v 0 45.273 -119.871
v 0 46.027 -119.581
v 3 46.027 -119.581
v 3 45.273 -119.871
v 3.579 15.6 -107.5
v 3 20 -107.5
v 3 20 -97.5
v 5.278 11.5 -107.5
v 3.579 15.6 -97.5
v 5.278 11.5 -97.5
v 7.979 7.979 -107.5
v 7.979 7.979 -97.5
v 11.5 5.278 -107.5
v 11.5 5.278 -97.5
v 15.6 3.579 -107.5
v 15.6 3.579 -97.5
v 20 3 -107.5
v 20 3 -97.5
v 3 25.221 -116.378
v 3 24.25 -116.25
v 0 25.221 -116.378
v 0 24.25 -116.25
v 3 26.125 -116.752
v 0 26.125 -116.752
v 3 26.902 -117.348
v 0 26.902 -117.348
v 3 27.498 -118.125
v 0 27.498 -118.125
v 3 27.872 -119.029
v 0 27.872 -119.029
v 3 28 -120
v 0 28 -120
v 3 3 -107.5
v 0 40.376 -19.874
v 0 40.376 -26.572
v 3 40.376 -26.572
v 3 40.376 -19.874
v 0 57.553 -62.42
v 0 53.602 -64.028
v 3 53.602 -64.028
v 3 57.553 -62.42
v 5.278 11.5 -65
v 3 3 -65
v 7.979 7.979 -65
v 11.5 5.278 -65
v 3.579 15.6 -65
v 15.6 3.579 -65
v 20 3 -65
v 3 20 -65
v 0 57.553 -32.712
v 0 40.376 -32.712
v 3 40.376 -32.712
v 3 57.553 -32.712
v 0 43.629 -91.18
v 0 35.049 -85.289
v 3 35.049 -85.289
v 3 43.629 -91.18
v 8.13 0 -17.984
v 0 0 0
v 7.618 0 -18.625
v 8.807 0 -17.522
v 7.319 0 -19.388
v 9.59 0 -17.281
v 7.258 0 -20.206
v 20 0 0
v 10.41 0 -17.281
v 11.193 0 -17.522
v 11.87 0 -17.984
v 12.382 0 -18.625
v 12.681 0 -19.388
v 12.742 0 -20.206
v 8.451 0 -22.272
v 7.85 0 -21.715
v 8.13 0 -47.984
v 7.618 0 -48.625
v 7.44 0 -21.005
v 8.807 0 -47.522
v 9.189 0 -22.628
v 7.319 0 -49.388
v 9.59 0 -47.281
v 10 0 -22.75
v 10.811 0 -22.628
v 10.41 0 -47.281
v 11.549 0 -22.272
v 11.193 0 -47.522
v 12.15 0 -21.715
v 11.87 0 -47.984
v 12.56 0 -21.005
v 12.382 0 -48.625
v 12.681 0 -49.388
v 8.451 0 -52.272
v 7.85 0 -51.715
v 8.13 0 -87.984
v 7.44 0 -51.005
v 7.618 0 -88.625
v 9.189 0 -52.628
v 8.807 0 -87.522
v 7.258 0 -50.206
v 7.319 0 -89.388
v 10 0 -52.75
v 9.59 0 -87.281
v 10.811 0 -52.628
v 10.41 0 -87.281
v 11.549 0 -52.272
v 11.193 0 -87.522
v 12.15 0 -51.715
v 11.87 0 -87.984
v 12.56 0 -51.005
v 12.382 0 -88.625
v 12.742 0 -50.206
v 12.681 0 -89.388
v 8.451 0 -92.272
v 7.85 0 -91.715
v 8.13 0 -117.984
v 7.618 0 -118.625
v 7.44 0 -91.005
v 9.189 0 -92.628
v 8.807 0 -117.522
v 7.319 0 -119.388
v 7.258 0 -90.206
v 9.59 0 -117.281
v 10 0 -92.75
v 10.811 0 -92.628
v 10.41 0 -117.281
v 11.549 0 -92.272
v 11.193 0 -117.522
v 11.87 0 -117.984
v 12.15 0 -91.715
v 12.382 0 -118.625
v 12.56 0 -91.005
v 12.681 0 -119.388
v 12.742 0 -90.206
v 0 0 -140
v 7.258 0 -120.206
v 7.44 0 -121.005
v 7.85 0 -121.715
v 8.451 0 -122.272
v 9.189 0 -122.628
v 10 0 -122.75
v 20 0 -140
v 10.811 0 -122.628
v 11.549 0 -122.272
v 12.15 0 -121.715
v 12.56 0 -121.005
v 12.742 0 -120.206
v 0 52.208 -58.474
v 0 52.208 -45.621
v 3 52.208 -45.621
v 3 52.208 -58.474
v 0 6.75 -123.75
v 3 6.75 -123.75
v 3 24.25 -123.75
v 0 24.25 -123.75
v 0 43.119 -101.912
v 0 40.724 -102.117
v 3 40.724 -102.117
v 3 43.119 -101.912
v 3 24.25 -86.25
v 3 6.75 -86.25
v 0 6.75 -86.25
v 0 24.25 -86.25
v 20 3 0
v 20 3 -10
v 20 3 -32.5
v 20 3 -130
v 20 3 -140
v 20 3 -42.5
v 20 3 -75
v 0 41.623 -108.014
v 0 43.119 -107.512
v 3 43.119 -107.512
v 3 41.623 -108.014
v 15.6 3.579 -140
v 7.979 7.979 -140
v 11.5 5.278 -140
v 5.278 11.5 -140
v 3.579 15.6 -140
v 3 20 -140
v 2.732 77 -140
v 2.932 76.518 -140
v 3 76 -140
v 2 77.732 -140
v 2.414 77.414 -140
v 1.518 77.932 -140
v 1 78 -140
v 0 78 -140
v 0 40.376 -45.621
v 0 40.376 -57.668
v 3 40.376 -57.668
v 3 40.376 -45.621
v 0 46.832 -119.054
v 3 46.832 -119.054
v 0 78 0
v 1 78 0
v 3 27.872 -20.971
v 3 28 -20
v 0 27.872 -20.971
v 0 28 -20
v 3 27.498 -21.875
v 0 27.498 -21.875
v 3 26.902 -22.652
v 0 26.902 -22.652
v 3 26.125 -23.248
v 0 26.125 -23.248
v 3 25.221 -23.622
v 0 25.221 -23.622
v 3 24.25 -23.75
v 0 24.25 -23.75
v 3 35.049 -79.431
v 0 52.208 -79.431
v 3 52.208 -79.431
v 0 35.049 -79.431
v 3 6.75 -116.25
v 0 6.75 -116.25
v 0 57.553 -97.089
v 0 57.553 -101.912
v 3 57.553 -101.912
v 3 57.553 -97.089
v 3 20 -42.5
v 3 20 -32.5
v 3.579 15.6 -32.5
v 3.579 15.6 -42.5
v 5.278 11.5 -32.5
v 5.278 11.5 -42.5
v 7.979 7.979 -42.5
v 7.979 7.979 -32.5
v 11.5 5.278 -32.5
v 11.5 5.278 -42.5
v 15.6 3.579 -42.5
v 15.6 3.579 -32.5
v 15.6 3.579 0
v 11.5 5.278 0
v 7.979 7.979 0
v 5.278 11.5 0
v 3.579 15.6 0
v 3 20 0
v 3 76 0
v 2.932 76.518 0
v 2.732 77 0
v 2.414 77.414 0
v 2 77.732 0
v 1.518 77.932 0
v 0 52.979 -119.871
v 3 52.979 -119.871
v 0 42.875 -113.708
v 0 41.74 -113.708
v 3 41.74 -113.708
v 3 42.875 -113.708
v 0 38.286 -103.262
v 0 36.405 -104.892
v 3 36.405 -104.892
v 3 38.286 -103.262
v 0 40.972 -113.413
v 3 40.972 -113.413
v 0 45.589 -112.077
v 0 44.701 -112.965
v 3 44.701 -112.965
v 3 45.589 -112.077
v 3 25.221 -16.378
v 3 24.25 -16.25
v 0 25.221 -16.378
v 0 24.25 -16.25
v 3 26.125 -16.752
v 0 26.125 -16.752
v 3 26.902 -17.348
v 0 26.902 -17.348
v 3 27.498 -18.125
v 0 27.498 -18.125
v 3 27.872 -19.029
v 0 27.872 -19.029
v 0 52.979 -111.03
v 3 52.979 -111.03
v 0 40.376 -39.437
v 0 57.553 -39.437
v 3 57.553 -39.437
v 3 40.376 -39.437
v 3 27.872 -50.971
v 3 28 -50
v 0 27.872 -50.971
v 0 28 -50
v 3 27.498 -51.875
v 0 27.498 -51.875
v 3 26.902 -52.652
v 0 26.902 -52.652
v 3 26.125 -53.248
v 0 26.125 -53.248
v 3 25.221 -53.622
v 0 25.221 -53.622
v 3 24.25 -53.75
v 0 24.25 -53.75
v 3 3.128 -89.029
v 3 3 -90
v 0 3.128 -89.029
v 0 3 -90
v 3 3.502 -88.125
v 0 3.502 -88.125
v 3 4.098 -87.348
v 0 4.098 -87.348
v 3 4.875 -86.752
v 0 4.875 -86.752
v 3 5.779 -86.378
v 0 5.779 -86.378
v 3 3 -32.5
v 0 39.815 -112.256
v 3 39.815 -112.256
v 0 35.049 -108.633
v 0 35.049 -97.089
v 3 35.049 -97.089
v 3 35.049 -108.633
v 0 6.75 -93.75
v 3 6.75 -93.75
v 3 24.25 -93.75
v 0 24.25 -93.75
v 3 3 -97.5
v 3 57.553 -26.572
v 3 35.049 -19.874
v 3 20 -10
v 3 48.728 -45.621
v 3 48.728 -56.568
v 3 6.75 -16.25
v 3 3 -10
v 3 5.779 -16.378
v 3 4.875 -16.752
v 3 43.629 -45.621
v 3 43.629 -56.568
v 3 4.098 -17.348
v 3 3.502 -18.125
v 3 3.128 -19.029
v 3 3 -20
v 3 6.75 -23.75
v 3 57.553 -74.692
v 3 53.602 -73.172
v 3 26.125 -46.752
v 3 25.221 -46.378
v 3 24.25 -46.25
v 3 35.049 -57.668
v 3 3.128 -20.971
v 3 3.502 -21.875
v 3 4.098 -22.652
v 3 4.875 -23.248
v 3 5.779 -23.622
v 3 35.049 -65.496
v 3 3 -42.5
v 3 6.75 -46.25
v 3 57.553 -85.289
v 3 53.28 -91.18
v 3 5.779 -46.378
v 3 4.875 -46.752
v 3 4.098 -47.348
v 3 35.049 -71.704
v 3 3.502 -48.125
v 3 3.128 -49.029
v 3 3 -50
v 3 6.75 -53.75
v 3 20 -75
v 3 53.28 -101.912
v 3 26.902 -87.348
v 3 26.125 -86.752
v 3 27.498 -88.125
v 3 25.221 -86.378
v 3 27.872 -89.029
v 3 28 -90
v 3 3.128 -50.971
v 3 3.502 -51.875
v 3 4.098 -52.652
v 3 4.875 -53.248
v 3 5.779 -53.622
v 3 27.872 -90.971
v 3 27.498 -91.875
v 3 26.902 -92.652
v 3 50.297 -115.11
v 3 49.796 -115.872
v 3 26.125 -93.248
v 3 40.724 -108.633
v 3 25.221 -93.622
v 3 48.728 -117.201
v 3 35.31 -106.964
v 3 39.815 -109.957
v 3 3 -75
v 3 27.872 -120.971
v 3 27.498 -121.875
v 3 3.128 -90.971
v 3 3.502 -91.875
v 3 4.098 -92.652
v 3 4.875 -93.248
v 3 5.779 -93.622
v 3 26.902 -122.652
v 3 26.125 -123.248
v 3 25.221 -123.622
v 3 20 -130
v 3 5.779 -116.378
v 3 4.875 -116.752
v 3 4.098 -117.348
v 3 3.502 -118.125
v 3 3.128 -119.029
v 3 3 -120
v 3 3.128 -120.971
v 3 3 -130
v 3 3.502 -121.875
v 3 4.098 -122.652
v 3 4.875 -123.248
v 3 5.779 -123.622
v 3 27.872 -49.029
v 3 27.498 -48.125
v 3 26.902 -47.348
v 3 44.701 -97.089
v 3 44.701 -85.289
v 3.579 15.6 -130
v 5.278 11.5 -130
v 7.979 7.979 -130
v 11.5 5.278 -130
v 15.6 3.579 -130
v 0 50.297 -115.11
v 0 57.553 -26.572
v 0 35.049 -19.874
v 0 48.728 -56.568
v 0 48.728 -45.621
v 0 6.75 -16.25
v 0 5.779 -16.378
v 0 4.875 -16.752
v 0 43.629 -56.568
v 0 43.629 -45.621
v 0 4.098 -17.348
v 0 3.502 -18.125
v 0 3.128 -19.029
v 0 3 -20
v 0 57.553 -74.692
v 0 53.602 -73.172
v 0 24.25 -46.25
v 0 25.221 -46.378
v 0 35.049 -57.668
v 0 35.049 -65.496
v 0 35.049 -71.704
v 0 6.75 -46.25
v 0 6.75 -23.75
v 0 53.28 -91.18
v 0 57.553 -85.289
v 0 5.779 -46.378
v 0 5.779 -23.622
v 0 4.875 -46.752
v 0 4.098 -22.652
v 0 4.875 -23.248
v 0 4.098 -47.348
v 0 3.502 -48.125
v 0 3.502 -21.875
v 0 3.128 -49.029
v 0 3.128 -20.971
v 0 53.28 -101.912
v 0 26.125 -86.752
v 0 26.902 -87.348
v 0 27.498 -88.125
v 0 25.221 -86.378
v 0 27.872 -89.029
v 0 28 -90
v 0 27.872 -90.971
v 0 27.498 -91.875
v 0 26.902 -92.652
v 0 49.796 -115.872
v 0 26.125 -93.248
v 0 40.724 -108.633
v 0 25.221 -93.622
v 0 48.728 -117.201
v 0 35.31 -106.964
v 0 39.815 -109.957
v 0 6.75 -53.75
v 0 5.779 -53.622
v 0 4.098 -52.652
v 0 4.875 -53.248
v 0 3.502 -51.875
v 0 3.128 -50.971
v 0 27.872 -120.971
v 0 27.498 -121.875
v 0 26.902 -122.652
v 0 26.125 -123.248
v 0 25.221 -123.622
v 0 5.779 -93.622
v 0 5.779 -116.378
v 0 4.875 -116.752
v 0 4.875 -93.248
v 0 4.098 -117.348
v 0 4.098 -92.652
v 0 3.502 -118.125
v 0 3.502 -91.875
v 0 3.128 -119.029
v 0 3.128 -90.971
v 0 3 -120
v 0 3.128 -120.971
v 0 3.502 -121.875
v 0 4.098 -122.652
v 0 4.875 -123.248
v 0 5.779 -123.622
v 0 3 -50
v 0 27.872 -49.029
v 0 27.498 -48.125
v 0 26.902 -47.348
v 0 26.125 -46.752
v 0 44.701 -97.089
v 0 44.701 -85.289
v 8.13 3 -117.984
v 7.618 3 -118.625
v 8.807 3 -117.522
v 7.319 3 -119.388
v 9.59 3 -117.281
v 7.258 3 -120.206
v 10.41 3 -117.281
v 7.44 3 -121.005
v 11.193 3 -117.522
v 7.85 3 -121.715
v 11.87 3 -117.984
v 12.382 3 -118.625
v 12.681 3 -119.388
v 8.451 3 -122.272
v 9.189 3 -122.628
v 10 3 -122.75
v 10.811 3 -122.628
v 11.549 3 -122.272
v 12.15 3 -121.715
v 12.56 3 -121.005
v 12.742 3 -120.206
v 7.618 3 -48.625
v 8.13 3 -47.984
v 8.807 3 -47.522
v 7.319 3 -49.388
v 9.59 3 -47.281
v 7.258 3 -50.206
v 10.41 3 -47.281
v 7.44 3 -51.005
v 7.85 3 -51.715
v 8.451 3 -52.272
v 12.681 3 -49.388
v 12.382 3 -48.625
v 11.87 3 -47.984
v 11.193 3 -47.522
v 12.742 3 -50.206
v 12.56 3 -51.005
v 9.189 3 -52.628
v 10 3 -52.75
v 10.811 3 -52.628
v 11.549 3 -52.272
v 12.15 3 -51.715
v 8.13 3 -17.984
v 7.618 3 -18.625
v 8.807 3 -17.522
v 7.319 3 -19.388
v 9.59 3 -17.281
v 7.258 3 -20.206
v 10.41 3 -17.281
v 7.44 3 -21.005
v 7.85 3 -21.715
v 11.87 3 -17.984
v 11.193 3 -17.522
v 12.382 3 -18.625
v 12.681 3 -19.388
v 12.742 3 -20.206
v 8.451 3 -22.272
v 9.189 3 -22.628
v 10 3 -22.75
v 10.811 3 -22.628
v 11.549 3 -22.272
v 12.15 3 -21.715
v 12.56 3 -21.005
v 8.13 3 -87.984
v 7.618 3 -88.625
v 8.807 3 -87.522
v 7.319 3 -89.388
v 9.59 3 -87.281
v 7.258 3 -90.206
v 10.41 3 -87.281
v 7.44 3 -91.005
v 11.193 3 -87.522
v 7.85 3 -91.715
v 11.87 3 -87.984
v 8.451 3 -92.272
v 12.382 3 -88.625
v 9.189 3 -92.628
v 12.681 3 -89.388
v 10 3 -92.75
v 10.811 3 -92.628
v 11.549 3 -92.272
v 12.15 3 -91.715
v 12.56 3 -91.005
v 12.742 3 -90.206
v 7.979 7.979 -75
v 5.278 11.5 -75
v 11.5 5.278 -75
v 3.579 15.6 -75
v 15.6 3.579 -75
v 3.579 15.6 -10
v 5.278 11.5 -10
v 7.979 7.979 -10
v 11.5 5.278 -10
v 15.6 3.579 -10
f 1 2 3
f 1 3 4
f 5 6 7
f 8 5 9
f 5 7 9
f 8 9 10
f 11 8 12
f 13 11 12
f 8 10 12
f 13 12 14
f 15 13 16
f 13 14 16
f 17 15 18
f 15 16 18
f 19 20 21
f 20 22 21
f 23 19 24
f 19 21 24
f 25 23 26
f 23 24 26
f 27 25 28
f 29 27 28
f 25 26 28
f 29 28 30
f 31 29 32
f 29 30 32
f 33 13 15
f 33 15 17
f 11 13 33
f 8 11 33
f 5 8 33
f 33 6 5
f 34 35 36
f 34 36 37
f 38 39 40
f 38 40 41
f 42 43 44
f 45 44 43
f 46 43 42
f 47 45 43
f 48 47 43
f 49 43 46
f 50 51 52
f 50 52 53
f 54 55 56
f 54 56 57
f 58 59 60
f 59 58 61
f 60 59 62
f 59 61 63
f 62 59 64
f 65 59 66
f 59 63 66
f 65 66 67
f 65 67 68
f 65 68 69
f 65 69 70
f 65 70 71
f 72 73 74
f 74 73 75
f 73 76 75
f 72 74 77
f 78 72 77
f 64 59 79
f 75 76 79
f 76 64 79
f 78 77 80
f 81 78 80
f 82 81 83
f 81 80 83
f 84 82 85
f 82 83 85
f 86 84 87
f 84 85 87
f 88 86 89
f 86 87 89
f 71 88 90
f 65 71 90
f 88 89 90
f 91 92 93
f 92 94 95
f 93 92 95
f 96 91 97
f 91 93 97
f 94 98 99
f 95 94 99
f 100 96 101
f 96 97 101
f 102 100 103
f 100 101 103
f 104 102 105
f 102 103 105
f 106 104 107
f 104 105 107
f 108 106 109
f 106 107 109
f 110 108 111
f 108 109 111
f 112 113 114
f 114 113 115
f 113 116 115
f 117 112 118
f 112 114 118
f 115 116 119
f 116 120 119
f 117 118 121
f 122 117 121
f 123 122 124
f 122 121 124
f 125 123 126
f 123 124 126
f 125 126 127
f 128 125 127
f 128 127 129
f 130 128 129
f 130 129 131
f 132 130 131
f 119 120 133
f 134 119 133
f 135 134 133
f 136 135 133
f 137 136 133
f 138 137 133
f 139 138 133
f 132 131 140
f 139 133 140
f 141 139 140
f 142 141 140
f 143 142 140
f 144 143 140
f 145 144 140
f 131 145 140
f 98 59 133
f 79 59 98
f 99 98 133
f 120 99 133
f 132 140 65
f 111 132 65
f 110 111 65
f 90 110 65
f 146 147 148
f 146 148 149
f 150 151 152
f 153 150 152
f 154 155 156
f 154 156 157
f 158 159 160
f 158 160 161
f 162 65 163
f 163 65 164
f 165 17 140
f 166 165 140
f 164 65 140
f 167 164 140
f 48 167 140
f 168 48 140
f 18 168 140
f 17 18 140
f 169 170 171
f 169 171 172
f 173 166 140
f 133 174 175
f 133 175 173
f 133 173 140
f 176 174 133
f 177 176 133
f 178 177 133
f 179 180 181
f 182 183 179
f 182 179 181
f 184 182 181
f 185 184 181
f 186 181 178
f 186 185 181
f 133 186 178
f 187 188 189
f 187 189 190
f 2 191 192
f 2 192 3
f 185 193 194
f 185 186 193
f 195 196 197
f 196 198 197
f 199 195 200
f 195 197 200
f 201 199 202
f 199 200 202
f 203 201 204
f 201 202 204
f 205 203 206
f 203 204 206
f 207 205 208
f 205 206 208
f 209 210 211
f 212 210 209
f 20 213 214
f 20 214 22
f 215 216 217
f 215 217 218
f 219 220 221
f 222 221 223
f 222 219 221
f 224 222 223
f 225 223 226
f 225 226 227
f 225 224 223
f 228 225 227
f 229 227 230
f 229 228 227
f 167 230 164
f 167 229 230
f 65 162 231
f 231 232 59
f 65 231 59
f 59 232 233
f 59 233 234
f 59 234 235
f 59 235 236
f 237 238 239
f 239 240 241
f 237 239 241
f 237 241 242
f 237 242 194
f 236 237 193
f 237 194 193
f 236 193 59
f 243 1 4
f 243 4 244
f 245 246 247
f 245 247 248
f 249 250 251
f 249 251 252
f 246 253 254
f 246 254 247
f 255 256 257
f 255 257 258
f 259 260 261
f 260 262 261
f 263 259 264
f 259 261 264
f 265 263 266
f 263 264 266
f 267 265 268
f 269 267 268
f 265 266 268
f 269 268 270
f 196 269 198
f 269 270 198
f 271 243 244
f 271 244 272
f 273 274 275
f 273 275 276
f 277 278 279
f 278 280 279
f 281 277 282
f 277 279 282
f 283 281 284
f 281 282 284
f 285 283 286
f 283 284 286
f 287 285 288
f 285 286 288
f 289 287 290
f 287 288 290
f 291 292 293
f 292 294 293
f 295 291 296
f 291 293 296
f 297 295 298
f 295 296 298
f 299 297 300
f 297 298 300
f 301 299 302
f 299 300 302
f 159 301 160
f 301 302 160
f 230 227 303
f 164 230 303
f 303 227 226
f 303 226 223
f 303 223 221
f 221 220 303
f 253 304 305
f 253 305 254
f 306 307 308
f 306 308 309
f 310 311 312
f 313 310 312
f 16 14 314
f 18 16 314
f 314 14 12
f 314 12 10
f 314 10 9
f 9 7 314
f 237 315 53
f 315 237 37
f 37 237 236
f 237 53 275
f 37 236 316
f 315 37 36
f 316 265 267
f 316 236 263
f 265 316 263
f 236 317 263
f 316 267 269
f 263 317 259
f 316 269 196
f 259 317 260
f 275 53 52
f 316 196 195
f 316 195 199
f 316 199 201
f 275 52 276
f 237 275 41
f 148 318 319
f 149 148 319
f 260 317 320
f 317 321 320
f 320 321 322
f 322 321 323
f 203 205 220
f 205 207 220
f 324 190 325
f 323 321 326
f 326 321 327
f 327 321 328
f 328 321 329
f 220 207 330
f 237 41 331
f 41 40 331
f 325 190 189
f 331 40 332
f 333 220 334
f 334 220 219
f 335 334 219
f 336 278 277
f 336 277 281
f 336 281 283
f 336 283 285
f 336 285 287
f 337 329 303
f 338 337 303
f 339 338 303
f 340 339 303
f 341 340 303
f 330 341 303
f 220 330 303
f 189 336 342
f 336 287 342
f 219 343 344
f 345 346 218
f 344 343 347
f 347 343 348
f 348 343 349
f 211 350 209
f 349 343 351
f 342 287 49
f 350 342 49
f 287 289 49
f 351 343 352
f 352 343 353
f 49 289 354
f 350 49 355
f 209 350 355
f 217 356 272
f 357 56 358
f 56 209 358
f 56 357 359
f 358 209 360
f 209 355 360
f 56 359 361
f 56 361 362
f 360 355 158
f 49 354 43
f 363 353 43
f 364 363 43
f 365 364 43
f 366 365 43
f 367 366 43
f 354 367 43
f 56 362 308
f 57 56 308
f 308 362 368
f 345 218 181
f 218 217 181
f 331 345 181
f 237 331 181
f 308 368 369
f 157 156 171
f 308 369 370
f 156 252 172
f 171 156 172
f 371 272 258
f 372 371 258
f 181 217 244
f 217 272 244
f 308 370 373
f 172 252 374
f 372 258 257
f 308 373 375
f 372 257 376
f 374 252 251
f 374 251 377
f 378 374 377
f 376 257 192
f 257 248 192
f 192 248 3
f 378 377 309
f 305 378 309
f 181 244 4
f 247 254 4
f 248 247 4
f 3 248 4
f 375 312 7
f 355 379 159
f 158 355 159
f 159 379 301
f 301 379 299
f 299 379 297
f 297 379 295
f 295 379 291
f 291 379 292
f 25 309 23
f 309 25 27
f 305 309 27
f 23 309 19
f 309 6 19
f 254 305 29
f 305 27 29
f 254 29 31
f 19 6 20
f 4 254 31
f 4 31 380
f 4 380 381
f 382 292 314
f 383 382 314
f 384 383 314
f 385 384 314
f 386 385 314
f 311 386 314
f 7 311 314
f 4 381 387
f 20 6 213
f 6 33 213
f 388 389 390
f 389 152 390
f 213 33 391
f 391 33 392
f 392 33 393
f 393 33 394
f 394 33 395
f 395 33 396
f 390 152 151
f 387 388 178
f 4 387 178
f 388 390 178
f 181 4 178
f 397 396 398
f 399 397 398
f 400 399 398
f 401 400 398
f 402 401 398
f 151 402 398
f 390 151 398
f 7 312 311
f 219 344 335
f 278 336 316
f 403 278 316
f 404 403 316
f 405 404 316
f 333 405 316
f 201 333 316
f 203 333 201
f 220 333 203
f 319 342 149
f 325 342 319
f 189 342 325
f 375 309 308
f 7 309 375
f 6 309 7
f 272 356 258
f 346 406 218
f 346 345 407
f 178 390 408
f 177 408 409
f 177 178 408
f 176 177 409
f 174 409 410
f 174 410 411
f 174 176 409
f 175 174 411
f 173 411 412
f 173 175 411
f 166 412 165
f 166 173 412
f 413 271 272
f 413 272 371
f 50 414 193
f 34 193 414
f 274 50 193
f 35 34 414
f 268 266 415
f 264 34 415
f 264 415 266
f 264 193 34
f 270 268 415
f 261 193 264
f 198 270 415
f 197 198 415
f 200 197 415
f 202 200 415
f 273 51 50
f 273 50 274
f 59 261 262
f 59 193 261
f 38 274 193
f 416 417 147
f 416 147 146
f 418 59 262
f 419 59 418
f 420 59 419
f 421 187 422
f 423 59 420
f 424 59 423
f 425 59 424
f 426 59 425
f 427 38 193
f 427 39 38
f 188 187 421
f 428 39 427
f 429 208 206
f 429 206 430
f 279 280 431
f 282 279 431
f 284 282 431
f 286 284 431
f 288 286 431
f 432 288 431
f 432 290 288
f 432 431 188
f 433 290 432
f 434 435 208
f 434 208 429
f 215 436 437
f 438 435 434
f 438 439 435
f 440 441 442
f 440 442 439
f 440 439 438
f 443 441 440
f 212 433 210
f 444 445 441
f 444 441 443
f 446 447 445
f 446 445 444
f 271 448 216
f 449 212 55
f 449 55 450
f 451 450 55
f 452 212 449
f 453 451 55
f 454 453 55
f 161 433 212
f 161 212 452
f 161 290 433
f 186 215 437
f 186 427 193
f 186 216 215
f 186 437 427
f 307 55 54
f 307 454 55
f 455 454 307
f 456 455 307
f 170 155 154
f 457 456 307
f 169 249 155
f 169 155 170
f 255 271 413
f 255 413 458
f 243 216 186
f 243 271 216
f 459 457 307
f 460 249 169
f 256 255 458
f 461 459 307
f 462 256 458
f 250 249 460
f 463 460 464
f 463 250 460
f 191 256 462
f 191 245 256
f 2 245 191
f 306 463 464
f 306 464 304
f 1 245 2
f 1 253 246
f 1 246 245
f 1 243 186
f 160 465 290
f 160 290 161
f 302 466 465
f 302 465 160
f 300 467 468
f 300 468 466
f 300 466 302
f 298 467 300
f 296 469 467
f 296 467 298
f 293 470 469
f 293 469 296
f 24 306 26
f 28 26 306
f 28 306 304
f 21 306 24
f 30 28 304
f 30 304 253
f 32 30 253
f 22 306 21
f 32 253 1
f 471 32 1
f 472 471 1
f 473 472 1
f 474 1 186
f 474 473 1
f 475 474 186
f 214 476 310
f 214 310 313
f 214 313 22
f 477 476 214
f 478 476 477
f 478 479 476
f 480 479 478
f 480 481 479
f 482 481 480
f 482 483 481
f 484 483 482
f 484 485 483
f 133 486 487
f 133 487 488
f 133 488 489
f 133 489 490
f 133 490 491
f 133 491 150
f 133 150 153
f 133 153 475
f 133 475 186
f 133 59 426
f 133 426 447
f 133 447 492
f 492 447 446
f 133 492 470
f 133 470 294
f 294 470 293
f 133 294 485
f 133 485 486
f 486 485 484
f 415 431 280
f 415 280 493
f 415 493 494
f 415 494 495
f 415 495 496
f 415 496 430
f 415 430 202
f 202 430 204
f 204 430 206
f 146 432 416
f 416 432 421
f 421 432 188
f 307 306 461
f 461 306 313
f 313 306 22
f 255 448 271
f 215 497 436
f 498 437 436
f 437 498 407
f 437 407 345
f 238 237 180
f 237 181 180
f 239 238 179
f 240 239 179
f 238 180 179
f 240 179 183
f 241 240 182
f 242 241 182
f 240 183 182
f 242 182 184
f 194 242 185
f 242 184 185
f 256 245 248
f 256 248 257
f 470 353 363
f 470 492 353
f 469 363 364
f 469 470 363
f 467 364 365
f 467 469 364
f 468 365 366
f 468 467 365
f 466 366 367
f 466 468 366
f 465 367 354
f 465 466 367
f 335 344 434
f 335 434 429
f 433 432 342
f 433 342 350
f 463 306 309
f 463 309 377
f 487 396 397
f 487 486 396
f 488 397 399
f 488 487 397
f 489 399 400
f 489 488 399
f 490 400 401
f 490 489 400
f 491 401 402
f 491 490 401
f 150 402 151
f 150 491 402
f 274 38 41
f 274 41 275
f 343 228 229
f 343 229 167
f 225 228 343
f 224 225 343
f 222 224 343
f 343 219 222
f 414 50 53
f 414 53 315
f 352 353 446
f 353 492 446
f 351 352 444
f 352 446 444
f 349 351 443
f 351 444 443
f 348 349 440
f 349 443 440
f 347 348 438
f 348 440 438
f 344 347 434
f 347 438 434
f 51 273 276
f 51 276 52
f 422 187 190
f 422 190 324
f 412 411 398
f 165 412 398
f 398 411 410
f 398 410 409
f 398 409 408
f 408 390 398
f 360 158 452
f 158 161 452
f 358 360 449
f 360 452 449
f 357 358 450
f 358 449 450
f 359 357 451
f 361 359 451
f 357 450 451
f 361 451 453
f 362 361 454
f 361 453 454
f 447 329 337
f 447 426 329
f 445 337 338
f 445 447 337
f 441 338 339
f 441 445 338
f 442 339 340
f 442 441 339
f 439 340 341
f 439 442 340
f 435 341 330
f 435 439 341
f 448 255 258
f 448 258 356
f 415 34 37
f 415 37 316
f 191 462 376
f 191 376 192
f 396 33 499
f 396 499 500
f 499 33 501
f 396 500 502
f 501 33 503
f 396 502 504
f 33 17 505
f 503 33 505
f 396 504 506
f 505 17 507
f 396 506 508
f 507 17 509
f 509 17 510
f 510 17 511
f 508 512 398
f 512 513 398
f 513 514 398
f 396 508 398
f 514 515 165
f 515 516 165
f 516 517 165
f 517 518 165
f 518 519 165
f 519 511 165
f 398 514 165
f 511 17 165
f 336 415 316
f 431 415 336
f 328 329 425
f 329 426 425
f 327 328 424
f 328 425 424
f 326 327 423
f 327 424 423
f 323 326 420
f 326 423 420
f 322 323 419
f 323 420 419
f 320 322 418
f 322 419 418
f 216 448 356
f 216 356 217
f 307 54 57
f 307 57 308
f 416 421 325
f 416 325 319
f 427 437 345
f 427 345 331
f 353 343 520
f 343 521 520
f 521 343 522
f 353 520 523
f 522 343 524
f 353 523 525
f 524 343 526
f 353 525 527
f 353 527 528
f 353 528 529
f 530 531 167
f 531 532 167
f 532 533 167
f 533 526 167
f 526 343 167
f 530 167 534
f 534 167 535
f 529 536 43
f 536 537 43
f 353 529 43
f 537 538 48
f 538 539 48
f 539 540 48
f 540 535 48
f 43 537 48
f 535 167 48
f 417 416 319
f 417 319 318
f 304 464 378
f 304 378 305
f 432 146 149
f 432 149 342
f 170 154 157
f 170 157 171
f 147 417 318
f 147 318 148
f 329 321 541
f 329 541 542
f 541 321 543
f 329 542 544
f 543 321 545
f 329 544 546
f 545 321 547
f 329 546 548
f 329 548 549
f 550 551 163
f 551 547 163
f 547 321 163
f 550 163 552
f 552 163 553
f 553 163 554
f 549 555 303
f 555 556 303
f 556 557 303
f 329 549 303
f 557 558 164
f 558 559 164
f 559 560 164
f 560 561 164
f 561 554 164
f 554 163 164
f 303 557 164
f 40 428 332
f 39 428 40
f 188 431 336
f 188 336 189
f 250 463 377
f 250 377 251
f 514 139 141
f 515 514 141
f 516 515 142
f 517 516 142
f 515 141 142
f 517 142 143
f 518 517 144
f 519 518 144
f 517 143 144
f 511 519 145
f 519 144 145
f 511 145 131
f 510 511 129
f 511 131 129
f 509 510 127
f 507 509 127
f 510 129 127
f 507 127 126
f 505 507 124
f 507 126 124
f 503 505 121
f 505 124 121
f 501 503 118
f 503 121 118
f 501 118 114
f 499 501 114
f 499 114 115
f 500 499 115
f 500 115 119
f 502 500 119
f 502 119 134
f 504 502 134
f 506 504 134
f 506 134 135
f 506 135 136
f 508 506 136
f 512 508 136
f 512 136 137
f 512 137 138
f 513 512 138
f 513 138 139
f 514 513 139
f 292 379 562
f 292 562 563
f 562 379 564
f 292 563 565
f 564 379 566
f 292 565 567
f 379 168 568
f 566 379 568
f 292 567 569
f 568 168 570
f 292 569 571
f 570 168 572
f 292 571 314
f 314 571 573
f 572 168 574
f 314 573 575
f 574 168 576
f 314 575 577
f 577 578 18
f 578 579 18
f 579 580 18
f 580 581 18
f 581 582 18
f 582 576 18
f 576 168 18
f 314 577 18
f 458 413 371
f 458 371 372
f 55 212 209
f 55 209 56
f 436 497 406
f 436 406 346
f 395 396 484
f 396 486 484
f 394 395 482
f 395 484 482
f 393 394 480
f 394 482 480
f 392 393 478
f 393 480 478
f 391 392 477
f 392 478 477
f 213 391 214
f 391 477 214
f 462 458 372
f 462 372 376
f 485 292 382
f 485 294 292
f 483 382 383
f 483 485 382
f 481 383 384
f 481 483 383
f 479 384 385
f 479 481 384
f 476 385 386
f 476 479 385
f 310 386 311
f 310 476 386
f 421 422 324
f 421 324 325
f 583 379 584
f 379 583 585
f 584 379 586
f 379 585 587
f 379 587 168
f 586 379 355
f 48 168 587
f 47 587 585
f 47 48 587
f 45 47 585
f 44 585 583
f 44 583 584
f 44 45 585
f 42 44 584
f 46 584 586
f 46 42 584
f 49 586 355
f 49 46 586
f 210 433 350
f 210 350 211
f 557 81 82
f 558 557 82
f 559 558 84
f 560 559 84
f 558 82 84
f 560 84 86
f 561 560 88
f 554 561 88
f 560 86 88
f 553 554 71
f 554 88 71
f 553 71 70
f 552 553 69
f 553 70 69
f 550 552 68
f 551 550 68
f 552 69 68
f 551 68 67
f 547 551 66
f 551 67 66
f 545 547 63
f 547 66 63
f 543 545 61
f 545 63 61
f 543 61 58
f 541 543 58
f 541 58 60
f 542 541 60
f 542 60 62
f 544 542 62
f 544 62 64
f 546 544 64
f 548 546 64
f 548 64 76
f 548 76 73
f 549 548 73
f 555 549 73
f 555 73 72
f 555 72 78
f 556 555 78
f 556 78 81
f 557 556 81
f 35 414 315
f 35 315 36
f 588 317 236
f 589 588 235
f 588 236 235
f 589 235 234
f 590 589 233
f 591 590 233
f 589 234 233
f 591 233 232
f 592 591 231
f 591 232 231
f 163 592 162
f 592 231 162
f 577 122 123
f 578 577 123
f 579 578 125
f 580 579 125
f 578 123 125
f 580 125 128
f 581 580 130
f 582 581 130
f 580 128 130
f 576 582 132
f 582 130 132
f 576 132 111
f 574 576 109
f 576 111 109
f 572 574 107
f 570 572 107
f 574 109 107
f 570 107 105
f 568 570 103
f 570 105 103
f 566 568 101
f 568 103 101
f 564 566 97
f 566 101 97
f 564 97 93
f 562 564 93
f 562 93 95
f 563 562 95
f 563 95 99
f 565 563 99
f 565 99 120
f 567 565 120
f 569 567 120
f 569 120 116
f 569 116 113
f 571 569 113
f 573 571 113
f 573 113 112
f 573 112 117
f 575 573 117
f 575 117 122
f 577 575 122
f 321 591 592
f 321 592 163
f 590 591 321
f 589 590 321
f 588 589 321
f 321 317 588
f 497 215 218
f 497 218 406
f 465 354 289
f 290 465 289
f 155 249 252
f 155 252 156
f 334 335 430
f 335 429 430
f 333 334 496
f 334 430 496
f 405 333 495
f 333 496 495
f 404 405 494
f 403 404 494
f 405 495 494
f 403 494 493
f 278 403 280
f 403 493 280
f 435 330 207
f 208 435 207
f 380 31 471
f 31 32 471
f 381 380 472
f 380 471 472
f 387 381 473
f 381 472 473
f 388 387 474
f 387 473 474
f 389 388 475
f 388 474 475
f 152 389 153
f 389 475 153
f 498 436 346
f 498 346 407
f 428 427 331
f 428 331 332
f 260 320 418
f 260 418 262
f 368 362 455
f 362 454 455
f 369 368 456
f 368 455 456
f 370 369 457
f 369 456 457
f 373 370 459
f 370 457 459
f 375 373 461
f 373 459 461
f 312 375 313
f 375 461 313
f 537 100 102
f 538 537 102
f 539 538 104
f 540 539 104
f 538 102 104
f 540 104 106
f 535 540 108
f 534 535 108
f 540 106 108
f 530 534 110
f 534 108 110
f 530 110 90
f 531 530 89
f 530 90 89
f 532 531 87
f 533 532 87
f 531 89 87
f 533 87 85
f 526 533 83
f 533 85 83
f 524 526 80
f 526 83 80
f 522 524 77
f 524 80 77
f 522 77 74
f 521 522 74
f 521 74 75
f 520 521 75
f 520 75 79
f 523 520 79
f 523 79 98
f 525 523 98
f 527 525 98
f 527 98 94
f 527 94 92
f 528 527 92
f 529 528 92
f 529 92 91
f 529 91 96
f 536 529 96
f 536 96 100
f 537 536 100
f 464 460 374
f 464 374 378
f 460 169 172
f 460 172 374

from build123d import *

# Parameters (mm, degrees)
SKETCH1_W           = 20
SKETCH1_H           = 140
BOSS_EXTRUDE1_DEPTH = 3
SKETCH2_W           = 3
SKETCH2_H           = 140
BOSS_EXTRUDE2_DEPTH = 75
SKETCH4_R           = 2.75
CUT_EXTRUDE1_DEPTH  = 10
CUT_EXTRUDE5_DEPTH  = 10
SKETCH13_W          = 7.5
SKETCH13_H          = 25
CUT_EXTRUDE6_DEPTH  = 162.161409773
BOSS_EXTRUDE3_DEPTH = 10
BOSS_EXTRUDE4_DEPTH = 5
FILLET1_R           = 3.75
BOSS_EXTRUDE5_DEPTH = 5
FILLET2_R           = 2


with BuildPart() as part:
    # Sketch1 → Boss-Extrude1 (new body)
    with BuildSketch(Plane(origin=(0, 0, 0), x_dir=(1, 0, 0), z_dir=(0, 1, 0))):
        with Locations((10, 70)):
            Rectangle(SKETCH1_W, SKETCH1_H)
    extrude(amount=BOSS_EXTRUDE1_DEPTH)

    # Sketch2 → Boss-Extrude2 (add)
    with BuildSketch(Plane(origin=(0, 3, 0), x_dir=(1, 0, 0), z_dir=(0, 1, 0))):
        with Locations((1.5, 70)):
            Rectangle(SKETCH2_W, SKETCH2_H)
    extrude(amount=BOSS_EXTRUDE2_DEPTH)

    # Sketch4 → Cut-Extrude1 (cut)
    with BuildSketch(Plane.XZ):
        with Locations(Location((10, -20, 0), (0, 0, 270))):
            Circle(SKETCH4_R)
        with Locations(Location((10, -50, 0), (0, 0, 270))):
            Circle(SKETCH4_R)
        with Locations(Location((10, -120, 0), (0, 0, 270))):
            Circle(SKETCH4_R)
        with Locations(Location((10, -90, 0), (0, 0, 270))):
            Circle(SKETCH4_R)
    extrude(amount=-CUT_EXTRUDE1_DEPTH, mode=Mode.SUBTRACT)

    # Sketch11 → Cut-Extrude5 (cut)
    with BuildSketch(Plane.ZY):
        Polygon((-19.87445306, 35.049470042), (-57.66845643, 35.049470042), (-57.66845643, 40.375700466), (-45.620710845, 40.375700466), (-45.620710845, 43.628558514), (-56.567955095, 43.628558514), (-56.567955095, 48.727655429), (-45.620710845, 48.727655429), (-45.620710845, 52.207646986), (-58.474335361, 52.207646986), (-65.4959872, 35.049470042), (-71.703981953, 35.049470042), (-79.431402399, 52.207646986), (-79.431402399, 35.049470042), (-85.289263166, 35.049470042), (-91.179988836, 43.628558514), (-97.088991148, 35.049470042), (-108.632759584, 35.049470042), (-106.964389123, 35.31022439), (-104.891781353, 36.405186985), (-103.26233135, 38.285640805), (-102.117236881, 40.724472664), (-101.911986572, 43.118576138), (-107.511545976, 43.118576138), (-108.014068376, 41.622730328), (-108.632759584, 40.724472664), (-109.956613224, 39.815464831), (-112.255625181, 39.815464831), (-113.41257384, 40.97241349), (-113.707994228, 41.740190554), (-113.707994228, 42.874973674), (-112.965179572, 44.700944573), (-112.077421007, 45.588703138), (-101.911986572, 53.280033045), (-101.911986572, 57.552931735), (-97.088991148, 57.552931735), (-97.088991148, 44.700944573), (-91.179988836, 53.280033045), (-85.289263166, 44.700944573), (-85.289263166, 57.552931735), (-74.691981497, 57.552931735), (-73.171666345, 53.601738278), (-64.027833458, 53.601738278), (-62.420466982, 57.552931735), (-39.437456147, 57.552931735), (-39.437456147, 40.375700466), (-32.711511222, 40.375700466), (-32.711511222, 57.552931735), (-26.571823468, 57.552931735), (-26.571823468, 40.375700466), (-19.87445306, 40.375700466), align=None)
        Polygon((-119.870983837, 52.978567636), (-111.030217867, 52.978567636), (-115.109674503, 50.296859936), (-115.872275446, 49.795549834), (-117.201338289, 48.727655429), (-119.05433748, 46.831756703), (-119.581300631, 46.026502002), (-119.870983837, 45.273325665), align=None)
    extrude(amount=-CUT_EXTRUDE5_DEPTH, mode=Mode.SUBTRACT)

    # Sketch13 → Cut-Extrude6 (cut, through all)
    with BuildSketch(Plane(origin=(3, 0, 0), x_dir=(0, 0, -1), z_dir=(1, 0, 0))):
        with Locations((20, 15.5)):
            Rectangle(SKETCH13_W, SKETCH13_H)
        with Locations((50, 15.5)):
            Rectangle(SKETCH13_W, SKETCH13_H)
        with Locations((90, 15.5)):
            Rectangle(SKETCH13_W, SKETCH13_H)
        with Locations((120, 15.5)):
            Rectangle(SKETCH13_W, SKETCH13_H)
    extrude(amount=-CUT_EXTRUDE6_DEPTH, mode=Mode.SUBTRACT)

    # Sketch14 → Boss-Extrude3 (add)
    with BuildSketch(Plane.XY):
        with BuildLine():
            Line((3, 3), (3, 20))
            ThreePointArc((3, 20), (7.97918472, 7.97918472), (20, 3))
            Line((20, 3), (3, 3))
        make_face()
    boss_extrude3 = extrude(amount=-BOSS_EXTRUDE3_DEPTH)

    # Mirror1: Boss-Extrude3 across plane
    add(boss_extrude3.mirror(Plane.XY.offset(-70)))

    # Sketch15 → Boss-Extrude4 (add, symmetric)
    with BuildSketch(Plane.XY.offset(-70)):
        with BuildLine():
            Line((3, 20), (3, 3))
            Line((3, 3), (20, 3))
            ThreePointArc((20, 3), (7.97918472, 7.97918472), (3, 20))
        make_face()
    extrude(amount=BOSS_EXTRUDE4_DEPTH, both=True)

    # Fillet1
    fillet1_edges = [part.edges().sort_by_distance(p)[0] for p in [
        (1.5, 3, -116.25),
        (1.5, 28, -116.25),
        (1.5, 28, -123.75),
        (1.5, 3, -123.75),
        (1.5, 3, -93.75),
        (1.5, 3, -86.25),
        (1.5, 28, -93.75),
        (1.5, 28, -86.25),
        (1.5, 3, -53.75),
        (1.5, 3, -46.25),
        (1.5, 28, -46.25),
        (1.5, 28, -53.75),
        (1.5, 3, -23.75),
        (1.5, 3, -16.25),
        (1.5, 28, -16.25),
        (1.5, 28, -23.75),
    ]]
    fillet(fillet1_edges, radius=FILLET1_R - 0.0001)  # a hair under: the kernel refuses the full size

    # Sketch16 → Boss-Extrude5 (add, symmetric)
    with BuildSketch(Plane(origin=(0, 0, -37.5), x_dir=(-1, 0, 0), z_dir=(0, 0, -1))):
        with BuildLine():
            Line((-20, 3), (-3, 3))
            Line((-3, 3), (-3, 20))
            ThreePointArc((-3, 20), (-7.97918472, 7.97918472), (-20, 3))
        make_face()
    boss_extrude5 = extrude(amount=BOSS_EXTRUDE5_DEPTH, both=True)

    # Mirror2: Boss-Extrude5 across plane
    add(boss_extrude5.mirror(Plane.XY.offset(-70)))

    # Fillet2
    fillet2_edges = [part.edges().sort_by_distance(p)[0] for p in [
        (3, 78, -70),
    ]]
    fillet(fillet2_edges, radius=FILLET2_R)


solid = part.part
